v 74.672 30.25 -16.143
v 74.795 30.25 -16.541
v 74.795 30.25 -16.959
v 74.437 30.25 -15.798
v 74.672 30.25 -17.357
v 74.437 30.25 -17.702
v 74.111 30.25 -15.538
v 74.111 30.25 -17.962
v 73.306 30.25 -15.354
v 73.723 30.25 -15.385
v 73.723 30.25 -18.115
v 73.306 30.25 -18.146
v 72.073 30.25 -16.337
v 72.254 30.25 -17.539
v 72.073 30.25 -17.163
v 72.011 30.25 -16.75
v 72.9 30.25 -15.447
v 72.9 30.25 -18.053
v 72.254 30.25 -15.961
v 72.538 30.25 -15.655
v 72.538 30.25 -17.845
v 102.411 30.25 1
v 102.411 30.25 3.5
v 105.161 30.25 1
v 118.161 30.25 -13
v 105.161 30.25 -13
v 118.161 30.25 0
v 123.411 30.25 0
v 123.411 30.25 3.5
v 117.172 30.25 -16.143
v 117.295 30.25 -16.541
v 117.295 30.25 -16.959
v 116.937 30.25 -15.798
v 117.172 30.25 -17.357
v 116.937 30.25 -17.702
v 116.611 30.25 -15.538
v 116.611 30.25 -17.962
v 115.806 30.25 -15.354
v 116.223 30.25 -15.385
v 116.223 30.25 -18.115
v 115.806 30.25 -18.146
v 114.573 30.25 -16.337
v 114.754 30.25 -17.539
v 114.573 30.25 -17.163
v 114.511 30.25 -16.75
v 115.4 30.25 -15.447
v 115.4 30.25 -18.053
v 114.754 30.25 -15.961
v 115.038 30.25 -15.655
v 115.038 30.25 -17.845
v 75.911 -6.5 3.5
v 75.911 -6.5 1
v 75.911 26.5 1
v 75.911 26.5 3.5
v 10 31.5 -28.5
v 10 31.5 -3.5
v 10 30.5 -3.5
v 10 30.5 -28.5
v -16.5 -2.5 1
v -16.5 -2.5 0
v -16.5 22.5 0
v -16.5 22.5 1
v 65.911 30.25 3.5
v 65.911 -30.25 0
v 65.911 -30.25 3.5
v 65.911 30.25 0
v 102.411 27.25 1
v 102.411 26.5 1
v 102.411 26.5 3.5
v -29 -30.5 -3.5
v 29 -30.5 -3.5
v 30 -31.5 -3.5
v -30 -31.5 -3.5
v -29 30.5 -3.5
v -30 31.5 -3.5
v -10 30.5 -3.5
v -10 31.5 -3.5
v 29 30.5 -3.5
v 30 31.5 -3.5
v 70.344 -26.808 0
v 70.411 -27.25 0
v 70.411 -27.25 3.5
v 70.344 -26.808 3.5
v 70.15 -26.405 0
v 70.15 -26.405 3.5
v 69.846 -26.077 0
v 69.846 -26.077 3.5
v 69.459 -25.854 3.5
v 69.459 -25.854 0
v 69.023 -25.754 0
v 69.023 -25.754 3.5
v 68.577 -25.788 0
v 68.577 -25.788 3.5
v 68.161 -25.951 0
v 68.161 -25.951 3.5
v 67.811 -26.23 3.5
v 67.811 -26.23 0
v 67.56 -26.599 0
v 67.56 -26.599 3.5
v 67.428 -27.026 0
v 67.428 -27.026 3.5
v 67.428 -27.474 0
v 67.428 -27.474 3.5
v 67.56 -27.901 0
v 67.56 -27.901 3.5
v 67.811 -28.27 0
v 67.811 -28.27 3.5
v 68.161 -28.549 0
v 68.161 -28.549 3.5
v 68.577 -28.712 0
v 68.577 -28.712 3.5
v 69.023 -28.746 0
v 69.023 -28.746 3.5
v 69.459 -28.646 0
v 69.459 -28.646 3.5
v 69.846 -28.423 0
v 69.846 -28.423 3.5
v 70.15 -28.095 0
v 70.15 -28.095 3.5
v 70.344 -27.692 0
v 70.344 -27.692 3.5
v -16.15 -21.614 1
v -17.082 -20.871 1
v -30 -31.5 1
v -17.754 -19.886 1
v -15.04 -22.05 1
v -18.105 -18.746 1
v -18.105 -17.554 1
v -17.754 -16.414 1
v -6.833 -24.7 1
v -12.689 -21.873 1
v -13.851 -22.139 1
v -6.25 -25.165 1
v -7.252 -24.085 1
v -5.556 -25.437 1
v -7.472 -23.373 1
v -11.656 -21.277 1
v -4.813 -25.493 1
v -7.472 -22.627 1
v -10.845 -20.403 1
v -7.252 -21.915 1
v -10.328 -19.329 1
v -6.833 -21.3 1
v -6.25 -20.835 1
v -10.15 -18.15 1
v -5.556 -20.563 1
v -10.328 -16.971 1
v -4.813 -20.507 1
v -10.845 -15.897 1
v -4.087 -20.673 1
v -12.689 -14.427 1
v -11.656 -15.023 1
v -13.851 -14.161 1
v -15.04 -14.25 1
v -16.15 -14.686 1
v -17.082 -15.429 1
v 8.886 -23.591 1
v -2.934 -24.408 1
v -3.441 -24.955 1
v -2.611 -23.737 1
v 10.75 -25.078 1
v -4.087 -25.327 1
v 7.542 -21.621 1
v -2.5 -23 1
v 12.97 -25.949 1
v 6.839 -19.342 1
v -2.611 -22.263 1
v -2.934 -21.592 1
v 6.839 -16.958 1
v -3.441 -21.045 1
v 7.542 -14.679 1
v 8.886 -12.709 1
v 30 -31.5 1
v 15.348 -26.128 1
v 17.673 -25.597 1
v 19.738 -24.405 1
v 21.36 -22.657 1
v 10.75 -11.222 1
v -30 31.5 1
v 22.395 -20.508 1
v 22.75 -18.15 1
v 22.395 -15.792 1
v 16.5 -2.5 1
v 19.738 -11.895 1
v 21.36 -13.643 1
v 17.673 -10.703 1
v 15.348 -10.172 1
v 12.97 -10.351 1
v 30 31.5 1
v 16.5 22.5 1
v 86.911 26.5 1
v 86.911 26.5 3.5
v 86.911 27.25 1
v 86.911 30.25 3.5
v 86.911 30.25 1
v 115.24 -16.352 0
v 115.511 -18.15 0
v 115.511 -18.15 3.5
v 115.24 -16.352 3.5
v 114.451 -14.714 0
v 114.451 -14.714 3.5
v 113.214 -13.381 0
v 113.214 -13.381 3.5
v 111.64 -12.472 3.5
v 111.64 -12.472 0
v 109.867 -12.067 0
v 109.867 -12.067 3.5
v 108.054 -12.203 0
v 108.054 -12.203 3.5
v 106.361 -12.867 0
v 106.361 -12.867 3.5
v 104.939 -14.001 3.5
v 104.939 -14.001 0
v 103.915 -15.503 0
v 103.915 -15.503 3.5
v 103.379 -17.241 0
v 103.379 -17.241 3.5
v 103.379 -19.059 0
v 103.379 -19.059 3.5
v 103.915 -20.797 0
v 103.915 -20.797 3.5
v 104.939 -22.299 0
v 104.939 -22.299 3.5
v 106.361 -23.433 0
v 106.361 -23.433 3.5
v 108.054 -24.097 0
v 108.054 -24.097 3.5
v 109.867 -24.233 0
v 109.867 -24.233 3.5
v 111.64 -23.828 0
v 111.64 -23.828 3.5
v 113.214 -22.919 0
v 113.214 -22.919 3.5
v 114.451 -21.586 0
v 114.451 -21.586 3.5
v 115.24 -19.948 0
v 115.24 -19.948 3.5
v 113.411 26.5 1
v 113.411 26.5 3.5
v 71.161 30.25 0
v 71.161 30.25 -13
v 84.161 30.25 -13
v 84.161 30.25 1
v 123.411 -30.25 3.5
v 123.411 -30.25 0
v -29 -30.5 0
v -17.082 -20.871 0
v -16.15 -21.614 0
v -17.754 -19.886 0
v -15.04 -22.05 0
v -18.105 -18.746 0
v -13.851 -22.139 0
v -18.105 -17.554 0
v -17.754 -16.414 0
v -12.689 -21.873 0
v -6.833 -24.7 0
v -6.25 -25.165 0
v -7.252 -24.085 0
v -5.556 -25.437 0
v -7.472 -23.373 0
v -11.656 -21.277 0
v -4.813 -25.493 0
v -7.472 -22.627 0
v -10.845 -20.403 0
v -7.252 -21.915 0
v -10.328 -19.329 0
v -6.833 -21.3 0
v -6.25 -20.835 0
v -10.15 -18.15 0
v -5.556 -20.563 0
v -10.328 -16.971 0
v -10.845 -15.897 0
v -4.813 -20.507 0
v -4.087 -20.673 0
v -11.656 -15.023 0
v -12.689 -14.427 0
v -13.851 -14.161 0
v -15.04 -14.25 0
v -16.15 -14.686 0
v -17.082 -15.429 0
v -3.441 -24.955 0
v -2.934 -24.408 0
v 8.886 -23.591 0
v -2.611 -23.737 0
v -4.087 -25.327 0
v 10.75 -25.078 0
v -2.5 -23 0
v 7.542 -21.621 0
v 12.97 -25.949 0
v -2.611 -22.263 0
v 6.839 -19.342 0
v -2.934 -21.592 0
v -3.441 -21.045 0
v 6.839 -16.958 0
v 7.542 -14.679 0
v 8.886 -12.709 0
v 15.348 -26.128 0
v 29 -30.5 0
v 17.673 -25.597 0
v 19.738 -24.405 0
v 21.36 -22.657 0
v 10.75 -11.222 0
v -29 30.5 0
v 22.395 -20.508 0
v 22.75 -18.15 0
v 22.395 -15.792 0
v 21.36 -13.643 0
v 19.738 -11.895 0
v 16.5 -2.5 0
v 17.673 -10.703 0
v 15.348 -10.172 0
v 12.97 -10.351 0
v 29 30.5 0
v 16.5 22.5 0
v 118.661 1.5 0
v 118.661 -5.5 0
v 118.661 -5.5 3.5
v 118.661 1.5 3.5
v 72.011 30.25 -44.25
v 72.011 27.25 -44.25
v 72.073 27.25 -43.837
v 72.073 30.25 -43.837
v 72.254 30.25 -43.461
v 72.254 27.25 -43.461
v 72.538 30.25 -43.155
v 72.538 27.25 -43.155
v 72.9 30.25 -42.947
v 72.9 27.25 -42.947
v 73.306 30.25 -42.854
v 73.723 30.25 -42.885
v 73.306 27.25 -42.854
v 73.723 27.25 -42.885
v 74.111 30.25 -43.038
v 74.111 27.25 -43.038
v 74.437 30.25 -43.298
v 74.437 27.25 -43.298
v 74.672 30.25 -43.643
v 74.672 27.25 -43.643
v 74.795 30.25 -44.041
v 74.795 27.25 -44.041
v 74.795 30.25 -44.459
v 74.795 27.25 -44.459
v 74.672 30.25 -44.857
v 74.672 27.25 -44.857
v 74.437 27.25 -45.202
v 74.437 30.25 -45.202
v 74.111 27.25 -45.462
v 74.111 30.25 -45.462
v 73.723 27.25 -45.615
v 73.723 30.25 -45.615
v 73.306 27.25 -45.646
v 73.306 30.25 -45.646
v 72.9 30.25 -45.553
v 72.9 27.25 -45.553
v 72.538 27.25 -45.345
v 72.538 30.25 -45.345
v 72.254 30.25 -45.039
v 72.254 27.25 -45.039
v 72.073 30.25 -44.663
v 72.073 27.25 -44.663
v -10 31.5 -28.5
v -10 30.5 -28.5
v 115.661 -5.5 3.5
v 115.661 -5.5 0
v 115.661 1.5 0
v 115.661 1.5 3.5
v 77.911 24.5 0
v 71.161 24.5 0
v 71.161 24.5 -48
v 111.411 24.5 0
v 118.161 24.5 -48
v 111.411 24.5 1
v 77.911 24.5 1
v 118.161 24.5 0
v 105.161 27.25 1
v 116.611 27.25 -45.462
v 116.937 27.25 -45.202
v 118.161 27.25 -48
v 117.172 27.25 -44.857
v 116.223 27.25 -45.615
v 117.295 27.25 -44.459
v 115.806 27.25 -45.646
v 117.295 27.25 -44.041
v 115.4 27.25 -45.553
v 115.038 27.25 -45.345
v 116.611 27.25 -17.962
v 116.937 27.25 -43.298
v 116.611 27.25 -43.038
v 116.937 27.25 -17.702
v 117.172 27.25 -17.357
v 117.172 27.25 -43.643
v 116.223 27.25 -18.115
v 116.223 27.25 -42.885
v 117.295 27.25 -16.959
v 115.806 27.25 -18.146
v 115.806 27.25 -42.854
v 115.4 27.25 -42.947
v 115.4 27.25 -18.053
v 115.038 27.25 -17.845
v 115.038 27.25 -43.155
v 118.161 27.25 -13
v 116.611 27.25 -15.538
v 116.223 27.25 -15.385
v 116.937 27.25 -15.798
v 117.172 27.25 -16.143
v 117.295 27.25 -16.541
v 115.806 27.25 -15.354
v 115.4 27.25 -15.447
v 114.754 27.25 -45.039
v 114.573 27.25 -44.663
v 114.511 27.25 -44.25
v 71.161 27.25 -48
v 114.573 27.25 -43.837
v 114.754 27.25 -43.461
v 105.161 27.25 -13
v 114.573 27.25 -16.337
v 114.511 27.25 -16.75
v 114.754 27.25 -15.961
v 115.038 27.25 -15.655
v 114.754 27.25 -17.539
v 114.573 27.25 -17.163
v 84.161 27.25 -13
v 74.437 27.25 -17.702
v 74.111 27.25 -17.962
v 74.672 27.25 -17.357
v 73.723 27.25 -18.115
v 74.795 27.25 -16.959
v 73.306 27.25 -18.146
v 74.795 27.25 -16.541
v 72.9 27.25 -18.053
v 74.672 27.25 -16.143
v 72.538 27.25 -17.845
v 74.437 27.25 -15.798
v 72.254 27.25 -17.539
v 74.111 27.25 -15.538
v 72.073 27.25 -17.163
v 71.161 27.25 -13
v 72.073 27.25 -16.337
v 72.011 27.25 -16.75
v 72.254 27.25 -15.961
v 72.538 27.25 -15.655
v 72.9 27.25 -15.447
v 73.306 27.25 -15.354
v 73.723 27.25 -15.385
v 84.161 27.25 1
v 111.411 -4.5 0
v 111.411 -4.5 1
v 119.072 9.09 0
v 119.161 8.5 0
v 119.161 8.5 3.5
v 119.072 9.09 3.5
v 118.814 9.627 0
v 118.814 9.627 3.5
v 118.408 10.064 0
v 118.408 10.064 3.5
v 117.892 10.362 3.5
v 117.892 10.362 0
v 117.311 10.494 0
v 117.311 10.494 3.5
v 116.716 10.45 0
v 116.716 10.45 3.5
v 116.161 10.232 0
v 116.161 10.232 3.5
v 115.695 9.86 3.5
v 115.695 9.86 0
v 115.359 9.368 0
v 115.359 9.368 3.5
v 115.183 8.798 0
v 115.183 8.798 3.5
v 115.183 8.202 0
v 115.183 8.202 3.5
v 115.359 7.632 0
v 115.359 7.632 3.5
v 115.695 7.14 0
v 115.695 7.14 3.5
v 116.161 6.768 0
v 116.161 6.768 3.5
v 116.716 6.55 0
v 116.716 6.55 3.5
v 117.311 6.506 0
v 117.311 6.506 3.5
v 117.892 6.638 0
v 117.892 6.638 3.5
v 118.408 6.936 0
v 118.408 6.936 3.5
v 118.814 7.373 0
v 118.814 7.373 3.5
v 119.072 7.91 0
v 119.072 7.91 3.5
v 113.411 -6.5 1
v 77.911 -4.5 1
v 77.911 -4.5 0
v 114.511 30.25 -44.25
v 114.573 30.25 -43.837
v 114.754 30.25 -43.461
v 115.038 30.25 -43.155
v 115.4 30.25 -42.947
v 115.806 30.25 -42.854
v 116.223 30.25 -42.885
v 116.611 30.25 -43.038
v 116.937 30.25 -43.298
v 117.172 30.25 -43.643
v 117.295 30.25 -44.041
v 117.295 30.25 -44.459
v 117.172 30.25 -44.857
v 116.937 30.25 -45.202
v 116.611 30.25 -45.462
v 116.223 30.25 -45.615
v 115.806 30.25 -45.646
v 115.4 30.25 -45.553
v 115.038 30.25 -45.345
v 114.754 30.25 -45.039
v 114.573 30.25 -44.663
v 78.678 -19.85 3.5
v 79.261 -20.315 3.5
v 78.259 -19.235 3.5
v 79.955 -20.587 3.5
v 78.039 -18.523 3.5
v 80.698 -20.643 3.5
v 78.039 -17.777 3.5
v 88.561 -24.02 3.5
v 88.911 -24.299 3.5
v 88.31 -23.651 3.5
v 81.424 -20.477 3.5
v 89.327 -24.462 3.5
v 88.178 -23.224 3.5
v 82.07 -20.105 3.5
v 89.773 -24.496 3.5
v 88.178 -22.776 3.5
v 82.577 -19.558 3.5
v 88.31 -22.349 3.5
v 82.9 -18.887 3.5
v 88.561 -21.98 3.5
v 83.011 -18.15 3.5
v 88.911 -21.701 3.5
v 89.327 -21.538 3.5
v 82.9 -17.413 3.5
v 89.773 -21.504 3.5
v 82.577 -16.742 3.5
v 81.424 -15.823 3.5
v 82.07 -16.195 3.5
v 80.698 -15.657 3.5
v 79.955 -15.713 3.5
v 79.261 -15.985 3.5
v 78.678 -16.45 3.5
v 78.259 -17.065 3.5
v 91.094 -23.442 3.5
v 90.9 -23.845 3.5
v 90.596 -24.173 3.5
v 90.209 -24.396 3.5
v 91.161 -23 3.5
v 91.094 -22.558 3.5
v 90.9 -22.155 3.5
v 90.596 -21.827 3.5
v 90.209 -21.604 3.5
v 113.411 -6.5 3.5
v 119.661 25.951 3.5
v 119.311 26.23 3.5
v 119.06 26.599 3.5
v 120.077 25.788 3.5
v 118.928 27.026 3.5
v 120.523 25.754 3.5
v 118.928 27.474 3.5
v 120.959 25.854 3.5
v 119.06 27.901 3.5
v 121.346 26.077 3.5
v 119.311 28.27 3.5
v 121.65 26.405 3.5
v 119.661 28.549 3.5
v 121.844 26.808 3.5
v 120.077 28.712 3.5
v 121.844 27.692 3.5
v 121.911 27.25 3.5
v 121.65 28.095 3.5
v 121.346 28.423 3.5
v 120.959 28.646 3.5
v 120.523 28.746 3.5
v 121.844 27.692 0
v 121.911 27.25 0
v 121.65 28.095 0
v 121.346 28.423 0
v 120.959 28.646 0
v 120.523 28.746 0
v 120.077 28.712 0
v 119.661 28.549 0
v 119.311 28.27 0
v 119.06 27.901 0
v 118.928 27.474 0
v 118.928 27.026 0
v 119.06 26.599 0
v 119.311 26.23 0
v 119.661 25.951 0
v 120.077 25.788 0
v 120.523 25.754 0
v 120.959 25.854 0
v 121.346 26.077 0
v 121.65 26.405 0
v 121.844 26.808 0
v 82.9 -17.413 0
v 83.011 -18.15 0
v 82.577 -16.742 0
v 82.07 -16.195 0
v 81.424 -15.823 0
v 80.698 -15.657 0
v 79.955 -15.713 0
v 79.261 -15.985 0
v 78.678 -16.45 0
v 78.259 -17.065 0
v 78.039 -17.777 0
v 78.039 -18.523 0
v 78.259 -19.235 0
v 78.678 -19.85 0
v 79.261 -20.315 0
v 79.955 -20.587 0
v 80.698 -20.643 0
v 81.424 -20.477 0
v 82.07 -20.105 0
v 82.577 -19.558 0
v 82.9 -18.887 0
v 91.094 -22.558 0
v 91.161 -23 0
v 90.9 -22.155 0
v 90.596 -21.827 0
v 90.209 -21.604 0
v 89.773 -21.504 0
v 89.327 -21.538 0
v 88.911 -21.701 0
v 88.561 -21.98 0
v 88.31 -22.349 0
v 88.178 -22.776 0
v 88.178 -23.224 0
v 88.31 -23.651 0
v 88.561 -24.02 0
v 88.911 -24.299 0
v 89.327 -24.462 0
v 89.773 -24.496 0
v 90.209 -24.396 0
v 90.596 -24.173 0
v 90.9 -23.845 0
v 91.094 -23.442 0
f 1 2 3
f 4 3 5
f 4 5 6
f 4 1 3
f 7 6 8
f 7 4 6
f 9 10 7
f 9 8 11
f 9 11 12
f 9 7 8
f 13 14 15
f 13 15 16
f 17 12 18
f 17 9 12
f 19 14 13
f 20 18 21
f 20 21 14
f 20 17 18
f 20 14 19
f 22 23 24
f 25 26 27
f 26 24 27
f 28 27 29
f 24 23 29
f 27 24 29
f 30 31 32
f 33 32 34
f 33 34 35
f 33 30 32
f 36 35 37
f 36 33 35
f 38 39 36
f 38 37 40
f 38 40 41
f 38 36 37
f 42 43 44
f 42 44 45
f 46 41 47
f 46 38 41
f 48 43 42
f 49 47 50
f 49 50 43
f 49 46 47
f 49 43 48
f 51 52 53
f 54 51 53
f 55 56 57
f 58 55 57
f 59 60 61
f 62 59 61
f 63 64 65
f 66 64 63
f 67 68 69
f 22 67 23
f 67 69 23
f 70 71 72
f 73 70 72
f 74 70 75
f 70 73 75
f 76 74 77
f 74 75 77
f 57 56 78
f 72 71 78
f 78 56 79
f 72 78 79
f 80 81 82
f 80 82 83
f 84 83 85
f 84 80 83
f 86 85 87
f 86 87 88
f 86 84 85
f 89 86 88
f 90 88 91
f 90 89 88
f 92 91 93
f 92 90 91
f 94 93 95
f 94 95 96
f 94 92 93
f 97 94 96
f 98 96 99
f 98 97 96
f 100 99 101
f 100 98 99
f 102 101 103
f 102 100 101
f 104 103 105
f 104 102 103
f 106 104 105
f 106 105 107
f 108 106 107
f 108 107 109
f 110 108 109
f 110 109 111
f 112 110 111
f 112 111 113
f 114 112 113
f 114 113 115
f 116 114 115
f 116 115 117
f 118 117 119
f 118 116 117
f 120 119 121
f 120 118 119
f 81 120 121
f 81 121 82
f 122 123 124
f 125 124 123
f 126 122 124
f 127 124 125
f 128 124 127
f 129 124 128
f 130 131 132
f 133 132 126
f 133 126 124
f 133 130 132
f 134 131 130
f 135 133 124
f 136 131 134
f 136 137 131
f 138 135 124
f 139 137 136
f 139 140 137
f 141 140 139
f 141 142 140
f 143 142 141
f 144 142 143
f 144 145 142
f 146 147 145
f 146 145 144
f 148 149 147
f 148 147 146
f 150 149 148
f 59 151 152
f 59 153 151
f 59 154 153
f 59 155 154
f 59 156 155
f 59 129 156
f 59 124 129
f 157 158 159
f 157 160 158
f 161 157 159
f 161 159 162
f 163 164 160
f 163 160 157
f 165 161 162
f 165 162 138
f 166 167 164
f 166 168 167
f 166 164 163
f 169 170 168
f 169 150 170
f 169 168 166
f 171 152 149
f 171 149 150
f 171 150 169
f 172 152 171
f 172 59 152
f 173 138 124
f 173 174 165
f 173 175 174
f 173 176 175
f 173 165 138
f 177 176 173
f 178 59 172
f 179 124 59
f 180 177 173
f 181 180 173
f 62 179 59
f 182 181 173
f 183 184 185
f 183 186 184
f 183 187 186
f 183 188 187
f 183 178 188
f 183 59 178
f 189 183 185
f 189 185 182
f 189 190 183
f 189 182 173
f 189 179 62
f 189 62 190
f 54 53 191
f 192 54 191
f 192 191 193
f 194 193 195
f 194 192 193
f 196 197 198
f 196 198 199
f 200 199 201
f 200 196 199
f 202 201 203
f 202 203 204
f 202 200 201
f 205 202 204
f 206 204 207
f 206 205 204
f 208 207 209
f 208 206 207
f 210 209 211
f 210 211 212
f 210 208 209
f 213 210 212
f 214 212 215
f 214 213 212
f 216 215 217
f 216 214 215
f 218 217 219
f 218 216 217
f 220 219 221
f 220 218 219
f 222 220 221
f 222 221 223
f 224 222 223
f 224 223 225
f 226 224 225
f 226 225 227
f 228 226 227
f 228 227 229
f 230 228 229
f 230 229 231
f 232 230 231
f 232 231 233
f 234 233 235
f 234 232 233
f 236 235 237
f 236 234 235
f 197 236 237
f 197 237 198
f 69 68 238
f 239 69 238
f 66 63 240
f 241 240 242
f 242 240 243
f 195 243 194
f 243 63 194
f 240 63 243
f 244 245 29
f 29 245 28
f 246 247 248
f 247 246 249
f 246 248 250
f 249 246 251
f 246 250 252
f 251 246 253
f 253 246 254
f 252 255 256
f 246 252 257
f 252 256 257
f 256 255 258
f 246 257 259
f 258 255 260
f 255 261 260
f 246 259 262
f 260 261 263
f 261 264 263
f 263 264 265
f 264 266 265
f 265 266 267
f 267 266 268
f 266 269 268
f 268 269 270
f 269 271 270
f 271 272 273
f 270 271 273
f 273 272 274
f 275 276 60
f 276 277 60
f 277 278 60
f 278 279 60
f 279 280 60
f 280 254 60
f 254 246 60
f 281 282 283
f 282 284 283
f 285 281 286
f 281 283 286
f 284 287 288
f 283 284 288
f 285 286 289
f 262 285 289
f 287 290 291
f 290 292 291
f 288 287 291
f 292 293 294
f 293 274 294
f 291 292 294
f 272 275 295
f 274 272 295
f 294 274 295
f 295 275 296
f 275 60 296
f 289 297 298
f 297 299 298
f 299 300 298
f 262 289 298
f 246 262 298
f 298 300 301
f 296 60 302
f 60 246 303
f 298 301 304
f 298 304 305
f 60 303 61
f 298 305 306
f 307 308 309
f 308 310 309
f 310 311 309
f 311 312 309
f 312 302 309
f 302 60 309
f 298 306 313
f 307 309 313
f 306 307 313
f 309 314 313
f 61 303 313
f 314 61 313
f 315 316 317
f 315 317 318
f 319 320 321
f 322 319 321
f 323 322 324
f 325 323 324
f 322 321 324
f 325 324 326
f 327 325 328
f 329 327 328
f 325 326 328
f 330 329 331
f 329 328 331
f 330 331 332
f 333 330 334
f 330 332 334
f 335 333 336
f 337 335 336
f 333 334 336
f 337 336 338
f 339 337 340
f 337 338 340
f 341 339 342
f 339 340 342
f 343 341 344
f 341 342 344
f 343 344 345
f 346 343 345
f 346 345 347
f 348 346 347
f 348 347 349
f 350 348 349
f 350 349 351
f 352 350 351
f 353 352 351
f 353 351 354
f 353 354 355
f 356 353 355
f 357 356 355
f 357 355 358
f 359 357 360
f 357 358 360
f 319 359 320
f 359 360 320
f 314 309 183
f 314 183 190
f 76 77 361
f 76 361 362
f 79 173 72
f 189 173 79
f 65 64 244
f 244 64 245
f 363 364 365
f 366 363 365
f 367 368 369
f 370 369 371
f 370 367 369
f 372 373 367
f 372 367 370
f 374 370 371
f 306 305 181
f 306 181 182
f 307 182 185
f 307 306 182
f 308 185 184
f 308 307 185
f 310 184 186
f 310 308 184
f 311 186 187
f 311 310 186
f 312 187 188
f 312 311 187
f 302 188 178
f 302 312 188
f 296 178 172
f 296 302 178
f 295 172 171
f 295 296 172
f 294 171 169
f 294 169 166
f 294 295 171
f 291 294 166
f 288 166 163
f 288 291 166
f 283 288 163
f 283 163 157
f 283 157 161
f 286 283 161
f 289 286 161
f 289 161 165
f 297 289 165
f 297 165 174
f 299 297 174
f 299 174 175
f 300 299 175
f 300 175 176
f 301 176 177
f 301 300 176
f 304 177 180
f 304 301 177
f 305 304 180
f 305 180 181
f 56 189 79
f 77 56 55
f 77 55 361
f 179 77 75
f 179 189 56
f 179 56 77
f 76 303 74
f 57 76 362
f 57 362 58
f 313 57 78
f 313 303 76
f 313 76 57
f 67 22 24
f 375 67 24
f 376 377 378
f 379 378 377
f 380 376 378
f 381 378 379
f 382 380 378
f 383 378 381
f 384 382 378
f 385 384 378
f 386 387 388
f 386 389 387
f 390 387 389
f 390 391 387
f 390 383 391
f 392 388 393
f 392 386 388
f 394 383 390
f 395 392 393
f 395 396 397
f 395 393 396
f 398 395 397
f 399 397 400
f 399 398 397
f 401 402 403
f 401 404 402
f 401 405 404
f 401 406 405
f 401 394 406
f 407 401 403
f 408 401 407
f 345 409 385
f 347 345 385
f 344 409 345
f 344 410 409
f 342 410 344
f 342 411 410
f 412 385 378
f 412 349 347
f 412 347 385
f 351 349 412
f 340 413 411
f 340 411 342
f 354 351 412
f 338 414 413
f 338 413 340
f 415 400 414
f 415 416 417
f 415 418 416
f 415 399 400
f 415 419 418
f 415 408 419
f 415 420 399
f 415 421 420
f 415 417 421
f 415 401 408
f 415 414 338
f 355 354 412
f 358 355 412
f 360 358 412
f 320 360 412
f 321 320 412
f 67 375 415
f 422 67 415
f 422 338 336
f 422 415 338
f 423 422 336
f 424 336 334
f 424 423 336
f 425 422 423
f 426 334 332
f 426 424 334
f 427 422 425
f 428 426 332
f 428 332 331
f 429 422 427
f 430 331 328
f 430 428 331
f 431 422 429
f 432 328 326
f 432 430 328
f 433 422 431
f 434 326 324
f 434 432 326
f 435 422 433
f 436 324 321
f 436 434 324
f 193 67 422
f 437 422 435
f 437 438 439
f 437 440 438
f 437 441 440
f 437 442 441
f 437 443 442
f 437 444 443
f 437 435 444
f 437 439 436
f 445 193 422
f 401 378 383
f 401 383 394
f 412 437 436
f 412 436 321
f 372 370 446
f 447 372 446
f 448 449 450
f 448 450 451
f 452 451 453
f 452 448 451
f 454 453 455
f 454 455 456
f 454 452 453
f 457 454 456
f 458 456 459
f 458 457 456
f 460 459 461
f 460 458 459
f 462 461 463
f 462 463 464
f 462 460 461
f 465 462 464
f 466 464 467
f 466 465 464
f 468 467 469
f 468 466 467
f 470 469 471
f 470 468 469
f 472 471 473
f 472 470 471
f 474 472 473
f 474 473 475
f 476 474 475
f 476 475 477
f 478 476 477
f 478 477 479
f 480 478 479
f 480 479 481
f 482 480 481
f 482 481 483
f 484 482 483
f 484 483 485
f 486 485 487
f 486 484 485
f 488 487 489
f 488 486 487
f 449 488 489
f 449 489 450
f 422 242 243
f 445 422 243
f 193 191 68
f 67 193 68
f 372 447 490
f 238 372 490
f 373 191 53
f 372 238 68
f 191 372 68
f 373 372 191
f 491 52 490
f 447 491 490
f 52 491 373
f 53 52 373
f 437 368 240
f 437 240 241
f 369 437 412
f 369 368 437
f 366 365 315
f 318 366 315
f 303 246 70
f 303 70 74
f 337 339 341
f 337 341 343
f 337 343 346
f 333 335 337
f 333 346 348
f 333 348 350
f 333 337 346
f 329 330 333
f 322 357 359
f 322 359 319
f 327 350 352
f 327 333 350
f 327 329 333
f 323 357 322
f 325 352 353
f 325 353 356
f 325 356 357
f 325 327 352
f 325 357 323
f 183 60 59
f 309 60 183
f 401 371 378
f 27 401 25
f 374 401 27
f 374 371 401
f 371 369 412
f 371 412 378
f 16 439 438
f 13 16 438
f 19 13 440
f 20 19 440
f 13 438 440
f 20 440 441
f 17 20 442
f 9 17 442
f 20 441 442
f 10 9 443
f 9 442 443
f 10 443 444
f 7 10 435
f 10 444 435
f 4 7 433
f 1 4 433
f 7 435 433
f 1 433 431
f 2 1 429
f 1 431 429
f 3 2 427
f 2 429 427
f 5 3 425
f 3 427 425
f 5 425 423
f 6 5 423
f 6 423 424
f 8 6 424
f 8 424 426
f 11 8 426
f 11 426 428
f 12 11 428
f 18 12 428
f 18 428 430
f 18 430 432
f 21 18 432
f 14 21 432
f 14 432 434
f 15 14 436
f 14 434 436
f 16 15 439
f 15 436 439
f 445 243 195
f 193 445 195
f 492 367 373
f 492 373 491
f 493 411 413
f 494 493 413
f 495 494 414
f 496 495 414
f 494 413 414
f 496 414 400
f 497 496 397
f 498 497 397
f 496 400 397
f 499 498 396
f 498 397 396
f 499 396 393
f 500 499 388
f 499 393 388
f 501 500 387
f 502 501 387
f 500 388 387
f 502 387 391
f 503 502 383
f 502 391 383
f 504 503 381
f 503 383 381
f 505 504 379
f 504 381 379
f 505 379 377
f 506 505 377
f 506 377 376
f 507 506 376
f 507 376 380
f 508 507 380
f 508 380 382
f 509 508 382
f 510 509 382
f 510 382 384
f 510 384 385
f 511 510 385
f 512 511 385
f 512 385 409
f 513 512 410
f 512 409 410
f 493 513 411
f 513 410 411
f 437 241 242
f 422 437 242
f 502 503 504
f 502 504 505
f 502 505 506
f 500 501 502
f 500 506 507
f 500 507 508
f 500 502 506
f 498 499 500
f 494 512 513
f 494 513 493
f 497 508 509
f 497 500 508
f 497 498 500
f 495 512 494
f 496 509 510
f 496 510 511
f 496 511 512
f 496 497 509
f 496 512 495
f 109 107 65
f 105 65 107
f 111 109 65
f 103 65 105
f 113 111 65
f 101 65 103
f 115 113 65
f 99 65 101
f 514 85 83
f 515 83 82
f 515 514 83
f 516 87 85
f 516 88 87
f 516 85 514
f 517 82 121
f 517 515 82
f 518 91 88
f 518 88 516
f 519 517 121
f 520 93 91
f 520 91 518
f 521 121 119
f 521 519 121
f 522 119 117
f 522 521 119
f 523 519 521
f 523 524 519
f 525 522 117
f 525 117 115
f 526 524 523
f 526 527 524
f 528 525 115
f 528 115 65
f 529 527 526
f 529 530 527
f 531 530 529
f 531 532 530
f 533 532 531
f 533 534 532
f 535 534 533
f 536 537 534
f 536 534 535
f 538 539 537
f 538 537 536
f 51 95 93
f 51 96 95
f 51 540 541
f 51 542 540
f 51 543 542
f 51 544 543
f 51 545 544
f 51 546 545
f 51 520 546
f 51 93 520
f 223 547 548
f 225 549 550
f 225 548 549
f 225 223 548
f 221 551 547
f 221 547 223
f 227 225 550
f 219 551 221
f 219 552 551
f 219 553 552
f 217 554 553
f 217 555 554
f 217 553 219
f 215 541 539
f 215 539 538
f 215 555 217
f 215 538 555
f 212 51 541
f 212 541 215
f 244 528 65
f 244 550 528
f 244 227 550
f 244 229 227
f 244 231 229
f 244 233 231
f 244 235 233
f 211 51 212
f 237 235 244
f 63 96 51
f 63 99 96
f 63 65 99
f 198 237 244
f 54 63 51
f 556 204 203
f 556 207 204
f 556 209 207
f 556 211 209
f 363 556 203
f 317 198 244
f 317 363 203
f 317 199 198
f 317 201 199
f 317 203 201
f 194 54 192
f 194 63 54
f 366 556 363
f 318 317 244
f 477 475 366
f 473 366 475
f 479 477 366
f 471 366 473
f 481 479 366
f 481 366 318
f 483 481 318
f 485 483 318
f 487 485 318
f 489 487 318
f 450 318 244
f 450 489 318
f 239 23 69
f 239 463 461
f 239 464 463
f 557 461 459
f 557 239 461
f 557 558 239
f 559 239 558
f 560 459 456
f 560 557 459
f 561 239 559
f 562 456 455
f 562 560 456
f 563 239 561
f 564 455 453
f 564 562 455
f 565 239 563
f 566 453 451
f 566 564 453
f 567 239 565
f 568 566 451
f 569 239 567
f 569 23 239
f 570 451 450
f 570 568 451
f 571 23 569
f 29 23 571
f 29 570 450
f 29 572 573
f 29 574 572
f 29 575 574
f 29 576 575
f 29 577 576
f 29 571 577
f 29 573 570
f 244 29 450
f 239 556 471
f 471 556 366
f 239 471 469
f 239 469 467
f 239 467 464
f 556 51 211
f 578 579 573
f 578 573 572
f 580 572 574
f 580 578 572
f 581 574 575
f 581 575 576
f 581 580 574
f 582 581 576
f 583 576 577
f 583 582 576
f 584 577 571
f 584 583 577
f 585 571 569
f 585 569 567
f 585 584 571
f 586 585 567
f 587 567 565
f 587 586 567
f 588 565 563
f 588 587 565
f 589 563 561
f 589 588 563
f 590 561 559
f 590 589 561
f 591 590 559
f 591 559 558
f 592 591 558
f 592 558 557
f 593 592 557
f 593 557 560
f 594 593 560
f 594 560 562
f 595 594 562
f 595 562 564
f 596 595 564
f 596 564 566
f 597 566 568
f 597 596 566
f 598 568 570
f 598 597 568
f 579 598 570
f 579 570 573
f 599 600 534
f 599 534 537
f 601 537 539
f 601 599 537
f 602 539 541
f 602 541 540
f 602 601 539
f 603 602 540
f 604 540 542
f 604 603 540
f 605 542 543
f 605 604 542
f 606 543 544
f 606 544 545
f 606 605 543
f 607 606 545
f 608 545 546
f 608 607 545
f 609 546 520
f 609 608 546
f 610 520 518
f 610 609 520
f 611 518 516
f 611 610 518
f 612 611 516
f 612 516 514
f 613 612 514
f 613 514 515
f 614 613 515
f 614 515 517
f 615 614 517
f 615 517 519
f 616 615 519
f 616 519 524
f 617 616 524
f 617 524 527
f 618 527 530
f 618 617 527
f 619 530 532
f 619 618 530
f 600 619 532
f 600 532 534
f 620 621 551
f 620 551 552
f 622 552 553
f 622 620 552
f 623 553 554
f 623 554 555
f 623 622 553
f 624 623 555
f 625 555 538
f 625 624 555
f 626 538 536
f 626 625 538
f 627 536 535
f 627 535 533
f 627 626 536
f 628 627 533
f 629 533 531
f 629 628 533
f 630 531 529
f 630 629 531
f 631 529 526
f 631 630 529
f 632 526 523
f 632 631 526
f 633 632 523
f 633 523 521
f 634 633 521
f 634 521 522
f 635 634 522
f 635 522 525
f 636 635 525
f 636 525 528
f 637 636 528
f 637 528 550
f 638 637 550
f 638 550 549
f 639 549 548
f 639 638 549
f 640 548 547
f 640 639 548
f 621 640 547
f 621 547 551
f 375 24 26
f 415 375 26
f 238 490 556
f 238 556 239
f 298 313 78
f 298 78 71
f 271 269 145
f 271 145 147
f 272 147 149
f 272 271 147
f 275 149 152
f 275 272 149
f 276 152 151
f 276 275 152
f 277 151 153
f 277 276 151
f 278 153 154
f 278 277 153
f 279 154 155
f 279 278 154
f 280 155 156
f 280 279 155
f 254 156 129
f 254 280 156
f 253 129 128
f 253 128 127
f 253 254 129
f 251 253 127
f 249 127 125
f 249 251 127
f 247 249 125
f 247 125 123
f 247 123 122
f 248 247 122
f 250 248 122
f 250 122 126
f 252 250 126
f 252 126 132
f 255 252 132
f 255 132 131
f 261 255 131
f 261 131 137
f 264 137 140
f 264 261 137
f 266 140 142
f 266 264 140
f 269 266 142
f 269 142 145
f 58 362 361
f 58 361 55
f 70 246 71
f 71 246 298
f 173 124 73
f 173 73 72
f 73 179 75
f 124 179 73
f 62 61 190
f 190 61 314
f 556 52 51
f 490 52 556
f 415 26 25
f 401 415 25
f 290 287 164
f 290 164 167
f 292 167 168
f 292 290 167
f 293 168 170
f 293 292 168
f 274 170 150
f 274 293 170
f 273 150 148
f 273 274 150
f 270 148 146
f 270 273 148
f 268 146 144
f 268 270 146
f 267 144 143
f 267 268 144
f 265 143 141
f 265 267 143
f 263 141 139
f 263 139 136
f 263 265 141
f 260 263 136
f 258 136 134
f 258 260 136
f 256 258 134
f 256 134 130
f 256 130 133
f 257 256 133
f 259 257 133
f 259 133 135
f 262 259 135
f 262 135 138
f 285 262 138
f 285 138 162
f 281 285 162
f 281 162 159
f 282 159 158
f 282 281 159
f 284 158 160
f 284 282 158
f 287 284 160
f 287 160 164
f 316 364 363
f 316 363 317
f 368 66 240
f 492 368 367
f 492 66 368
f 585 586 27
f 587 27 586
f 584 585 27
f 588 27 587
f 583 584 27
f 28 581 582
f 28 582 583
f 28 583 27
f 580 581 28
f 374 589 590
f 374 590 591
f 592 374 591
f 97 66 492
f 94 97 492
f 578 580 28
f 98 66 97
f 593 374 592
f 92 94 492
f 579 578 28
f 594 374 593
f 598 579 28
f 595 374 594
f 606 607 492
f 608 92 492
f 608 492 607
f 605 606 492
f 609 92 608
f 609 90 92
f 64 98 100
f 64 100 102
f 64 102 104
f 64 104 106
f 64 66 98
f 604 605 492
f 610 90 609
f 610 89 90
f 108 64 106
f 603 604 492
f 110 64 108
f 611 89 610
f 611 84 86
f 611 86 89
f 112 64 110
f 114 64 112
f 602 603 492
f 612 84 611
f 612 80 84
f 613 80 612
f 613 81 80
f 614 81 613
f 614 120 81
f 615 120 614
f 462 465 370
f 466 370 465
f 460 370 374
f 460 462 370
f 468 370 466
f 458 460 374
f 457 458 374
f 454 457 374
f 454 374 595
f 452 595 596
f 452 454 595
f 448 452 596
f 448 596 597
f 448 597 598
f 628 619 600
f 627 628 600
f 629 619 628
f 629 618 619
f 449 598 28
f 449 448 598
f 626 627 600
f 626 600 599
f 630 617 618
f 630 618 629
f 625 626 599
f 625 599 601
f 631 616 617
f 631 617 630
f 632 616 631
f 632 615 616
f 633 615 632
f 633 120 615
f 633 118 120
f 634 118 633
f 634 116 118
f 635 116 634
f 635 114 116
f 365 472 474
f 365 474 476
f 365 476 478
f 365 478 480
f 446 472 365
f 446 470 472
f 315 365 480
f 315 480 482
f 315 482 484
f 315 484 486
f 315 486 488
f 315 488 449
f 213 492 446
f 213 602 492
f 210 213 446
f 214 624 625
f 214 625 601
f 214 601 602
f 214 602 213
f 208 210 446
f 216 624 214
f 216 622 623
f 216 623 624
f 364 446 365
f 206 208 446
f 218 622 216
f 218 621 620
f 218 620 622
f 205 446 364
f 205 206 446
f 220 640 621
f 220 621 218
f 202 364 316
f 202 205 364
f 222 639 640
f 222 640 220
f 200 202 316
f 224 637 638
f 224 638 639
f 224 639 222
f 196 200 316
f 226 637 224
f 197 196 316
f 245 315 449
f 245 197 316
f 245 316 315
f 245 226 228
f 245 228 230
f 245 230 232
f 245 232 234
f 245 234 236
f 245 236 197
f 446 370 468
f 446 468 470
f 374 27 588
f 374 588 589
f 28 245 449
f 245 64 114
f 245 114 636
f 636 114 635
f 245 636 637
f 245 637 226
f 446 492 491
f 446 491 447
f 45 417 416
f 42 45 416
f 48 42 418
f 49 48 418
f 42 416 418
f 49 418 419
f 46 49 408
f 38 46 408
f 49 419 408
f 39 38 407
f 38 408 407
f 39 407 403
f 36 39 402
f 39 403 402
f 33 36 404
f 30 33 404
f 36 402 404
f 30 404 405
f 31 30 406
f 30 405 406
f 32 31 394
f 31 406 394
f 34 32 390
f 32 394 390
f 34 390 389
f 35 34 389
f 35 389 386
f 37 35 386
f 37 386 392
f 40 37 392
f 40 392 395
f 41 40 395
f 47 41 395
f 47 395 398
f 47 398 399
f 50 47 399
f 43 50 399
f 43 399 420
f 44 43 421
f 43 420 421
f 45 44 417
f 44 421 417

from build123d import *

# Parameters (mm, degrees)
F1_W      = 57.5
F1_H      = 60.5
F1_R      = 1.5
F1_R_2    = 2.5
F1_R_3    = 6.1
F1_W_2    = 3
F1_H_2    = 7
F1_W_3    = 37.5
F1_H_3    = 33
F1_R_4    = 2
F2_DEPTH  = 3.5
F4_W      = 37.5
F4_H      = 33
F4_W_2    = 33.5
F4_H_2    = 29
F5_DEPTH  = 1
F3_W      = 15.5
F3_H      = 3.75
F6_DEPTH  = 2.5
F8_DEPTH  = 5.75
F10_DEPTH = 3
F11_R     = 1.4
F12_DEPTH = 3
F0_W      = 58
F0_H      = 61
F0_R      = 4
F0_R_2    = 2.5
F0_R_3    = 8
F0_W_2    = 33
F0_H_2    = 25
F0_H_3    = 1
F13_DEPTH = 1
F14_DEPTH = 3.5
F15_W     = 20
F15_H     = 1
F16_DEPTH = 25


with BuildPart() as f2:
    # F1 (on Top) → F2 (new body)
    with BuildSketch(Plane.XY):
        with Locations((94.6610440163, 0)):
            Rectangle(F1_W, F1_H)
        with Locations((68.9110440163, -27.25)):
            Circle(F1_R, mode=Mode.SUBTRACT)
        with Locations((89.6610440163, -23)):
            Circle(F1_R, mode=Mode.SUBTRACT)
        with Locations((80.5110440163, -18.15)):
            Circle(F1_R_2, mode=Mode.SUBTRACT)
        with Locations((109.4110440163, -18.15)):
            Circle(F1_R_3, mode=Mode.SUBTRACT)
        with Locations((117.1610440163, -2)):
            Rectangle(F1_W_2, F1_H_2, mode=Mode.SUBTRACT)
        with Locations((94.6610440163, 10)):
            Rectangle(F1_W_3, F1_H_3, mode=Mode.SUBTRACT)
        with Locations((117.1610440163, 8.5)):
            Circle(F1_R_4, mode=Mode.SUBTRACT)
        with Locations((120.4110440163, 27.25)):
            Circle(F1_R, mode=Mode.SUBTRACT)
    extrude(amount=F2_DEPTH)

    # F4 (on face) → F5 (join)
    with BuildSketch(Plane(origin=(0, 0, 0), x_dir=(1, 0, 0), z_dir=(0, 0, -1))):
        with Locations((94.6610440163, -10)):
            Rectangle(F4_W, F4_H)
        with Locations((94.6610440163, -10)):
            Rectangle(F4_W_2, F4_H_2, mode=Mode.SUBTRACT)
    extrude(amount=-F5_DEPTH)

    # F3 (on face) → F6 (cut)
    with BuildSketch(Plane.XY.offset(3.5)):
        with Locations((94.6610440163, 28.375)):
            Rectangle(F3_W, F3_H)
    extrude(amount=-F6_DEPTH, mode=Mode.SUBTRACT)

    # F7 (on face) → F8 (join)
    with BuildSketch(Plane.XZ.offset(-24.5)):
        Polygon((77.9110440163, 0), (71.1610440163, 0), (71.1610440163, -48), (118.1610440163, -48), (118.1610440163, 0), (111.4110440163, 0), align=None)
    extrude(amount=-F8_DEPTH)

    # F9 (on face) → F10 (cut)
    with BuildSketch(Plane(origin=(0, 30.25, 0), x_dir=(-1, 0, 0), z_dir=(0, 1, 0))):
        Polygon((-105.1610440163, -13), (-118.1610440163, -13), (-118.1610440163, -48), (-71.1610440163, -48), (-71.1610440163, -13), (-84.1610440163, -13), (-86.9110440163, -13), align=None)
        Polygon((-105.1610440163, 1), (-105.1610440163, -13), (-86.9110440163, -13), (-84.1610440163, -13), (-84.1610440163, 1), (-86.9110440163, 1), (-102.4110440163, 1), align=None)
    extrude(amount=-F10_DEPTH, mode=Mode.SUBTRACT)

    # F11 (on face) → F12 (join)
    with BuildSketch(Plane(origin=(0, 27.25, 0), x_dir=(-1, 0, 0), z_dir=(0, 1, 0))):
        with Locations((-115.9110440163, -16.75)):
            Circle(F11_R)
        with Locations((-115.9110440163, -44.25)):
            Circle(F11_R)
        with Locations((-73.4110440163, -16.75)):
            Circle(F11_R)
        with Locations((-73.4110440163, -44.25)):
            Circle(F11_R)
    extrude(amount=F12_DEPTH)


with BuildPart() as f13:
    # F0 (on Top) → F13 (new body)
    with BuildSketch(Plane.XY):
        Rectangle(F0_W, F0_H)
        with Locations((-14.15, -18.15)):
            Circle(F0_R, mode=Mode.SUBTRACT)
        with Locations((-5, -23)):
            Circle(F0_R_2, mode=Mode.SUBTRACT)
        with Locations((14.75, -18.15)):
            Circle(F0_R_3, mode=Mode.SUBTRACT)
        with Locations((0, 10)):
            Rectangle(F0_W_2, F0_H_2, mode=Mode.SUBTRACT)
        Polygon((-29, -31.5), (-29, -30.5), (-29, 30.5), (-29, 31.5), (-30, 31.5), (-30, -31.5), align=None)
        with Locations((0, 31)):
            Rectangle(F0_W, F0_H_3)
        Polygon((29, 30.5), (29, -30.5), (29, -31.5), (30, -31.5), (30, 31.5), (29, 31.5), align=None)
        with Locations((0, -31)):
            Rectangle(F0_W, F0_H_3)
    extrude(amount=F13_DEPTH)

    # F0 (on Top) → F14 (join)
    with BuildSketch(Plane.XY):
        with Locations((0, 31)):
            Rectangle(F0_W, F0_H_3)
        Polygon((-29, -31.5), (-29, -30.5), (-29, 30.5), (-29, 31.5), (-30, 31.5), (-30, -31.5), align=None)
        with Locations((0, -31)):
            Rectangle(F0_W, F0_H_3)
        Polygon((29, 30.5), (29, -30.5), (29, -31.5), (30, -31.5), (30, 31.5), (29, 31.5), align=None)
    extrude(amount=-F14_DEPTH)

    # F15 (on face) → F16 (join)
    with BuildSketch(Plane(origin=(0, 0, -3.5), x_dir=(1, 0, 0), z_dir=(0, 0, -1))):
        with Locations((0, -31)):
            Rectangle(F15_W, F15_H)
    extrude(amount=F16_DEPTH)


solid = Compound([f2.part, f13.part])
